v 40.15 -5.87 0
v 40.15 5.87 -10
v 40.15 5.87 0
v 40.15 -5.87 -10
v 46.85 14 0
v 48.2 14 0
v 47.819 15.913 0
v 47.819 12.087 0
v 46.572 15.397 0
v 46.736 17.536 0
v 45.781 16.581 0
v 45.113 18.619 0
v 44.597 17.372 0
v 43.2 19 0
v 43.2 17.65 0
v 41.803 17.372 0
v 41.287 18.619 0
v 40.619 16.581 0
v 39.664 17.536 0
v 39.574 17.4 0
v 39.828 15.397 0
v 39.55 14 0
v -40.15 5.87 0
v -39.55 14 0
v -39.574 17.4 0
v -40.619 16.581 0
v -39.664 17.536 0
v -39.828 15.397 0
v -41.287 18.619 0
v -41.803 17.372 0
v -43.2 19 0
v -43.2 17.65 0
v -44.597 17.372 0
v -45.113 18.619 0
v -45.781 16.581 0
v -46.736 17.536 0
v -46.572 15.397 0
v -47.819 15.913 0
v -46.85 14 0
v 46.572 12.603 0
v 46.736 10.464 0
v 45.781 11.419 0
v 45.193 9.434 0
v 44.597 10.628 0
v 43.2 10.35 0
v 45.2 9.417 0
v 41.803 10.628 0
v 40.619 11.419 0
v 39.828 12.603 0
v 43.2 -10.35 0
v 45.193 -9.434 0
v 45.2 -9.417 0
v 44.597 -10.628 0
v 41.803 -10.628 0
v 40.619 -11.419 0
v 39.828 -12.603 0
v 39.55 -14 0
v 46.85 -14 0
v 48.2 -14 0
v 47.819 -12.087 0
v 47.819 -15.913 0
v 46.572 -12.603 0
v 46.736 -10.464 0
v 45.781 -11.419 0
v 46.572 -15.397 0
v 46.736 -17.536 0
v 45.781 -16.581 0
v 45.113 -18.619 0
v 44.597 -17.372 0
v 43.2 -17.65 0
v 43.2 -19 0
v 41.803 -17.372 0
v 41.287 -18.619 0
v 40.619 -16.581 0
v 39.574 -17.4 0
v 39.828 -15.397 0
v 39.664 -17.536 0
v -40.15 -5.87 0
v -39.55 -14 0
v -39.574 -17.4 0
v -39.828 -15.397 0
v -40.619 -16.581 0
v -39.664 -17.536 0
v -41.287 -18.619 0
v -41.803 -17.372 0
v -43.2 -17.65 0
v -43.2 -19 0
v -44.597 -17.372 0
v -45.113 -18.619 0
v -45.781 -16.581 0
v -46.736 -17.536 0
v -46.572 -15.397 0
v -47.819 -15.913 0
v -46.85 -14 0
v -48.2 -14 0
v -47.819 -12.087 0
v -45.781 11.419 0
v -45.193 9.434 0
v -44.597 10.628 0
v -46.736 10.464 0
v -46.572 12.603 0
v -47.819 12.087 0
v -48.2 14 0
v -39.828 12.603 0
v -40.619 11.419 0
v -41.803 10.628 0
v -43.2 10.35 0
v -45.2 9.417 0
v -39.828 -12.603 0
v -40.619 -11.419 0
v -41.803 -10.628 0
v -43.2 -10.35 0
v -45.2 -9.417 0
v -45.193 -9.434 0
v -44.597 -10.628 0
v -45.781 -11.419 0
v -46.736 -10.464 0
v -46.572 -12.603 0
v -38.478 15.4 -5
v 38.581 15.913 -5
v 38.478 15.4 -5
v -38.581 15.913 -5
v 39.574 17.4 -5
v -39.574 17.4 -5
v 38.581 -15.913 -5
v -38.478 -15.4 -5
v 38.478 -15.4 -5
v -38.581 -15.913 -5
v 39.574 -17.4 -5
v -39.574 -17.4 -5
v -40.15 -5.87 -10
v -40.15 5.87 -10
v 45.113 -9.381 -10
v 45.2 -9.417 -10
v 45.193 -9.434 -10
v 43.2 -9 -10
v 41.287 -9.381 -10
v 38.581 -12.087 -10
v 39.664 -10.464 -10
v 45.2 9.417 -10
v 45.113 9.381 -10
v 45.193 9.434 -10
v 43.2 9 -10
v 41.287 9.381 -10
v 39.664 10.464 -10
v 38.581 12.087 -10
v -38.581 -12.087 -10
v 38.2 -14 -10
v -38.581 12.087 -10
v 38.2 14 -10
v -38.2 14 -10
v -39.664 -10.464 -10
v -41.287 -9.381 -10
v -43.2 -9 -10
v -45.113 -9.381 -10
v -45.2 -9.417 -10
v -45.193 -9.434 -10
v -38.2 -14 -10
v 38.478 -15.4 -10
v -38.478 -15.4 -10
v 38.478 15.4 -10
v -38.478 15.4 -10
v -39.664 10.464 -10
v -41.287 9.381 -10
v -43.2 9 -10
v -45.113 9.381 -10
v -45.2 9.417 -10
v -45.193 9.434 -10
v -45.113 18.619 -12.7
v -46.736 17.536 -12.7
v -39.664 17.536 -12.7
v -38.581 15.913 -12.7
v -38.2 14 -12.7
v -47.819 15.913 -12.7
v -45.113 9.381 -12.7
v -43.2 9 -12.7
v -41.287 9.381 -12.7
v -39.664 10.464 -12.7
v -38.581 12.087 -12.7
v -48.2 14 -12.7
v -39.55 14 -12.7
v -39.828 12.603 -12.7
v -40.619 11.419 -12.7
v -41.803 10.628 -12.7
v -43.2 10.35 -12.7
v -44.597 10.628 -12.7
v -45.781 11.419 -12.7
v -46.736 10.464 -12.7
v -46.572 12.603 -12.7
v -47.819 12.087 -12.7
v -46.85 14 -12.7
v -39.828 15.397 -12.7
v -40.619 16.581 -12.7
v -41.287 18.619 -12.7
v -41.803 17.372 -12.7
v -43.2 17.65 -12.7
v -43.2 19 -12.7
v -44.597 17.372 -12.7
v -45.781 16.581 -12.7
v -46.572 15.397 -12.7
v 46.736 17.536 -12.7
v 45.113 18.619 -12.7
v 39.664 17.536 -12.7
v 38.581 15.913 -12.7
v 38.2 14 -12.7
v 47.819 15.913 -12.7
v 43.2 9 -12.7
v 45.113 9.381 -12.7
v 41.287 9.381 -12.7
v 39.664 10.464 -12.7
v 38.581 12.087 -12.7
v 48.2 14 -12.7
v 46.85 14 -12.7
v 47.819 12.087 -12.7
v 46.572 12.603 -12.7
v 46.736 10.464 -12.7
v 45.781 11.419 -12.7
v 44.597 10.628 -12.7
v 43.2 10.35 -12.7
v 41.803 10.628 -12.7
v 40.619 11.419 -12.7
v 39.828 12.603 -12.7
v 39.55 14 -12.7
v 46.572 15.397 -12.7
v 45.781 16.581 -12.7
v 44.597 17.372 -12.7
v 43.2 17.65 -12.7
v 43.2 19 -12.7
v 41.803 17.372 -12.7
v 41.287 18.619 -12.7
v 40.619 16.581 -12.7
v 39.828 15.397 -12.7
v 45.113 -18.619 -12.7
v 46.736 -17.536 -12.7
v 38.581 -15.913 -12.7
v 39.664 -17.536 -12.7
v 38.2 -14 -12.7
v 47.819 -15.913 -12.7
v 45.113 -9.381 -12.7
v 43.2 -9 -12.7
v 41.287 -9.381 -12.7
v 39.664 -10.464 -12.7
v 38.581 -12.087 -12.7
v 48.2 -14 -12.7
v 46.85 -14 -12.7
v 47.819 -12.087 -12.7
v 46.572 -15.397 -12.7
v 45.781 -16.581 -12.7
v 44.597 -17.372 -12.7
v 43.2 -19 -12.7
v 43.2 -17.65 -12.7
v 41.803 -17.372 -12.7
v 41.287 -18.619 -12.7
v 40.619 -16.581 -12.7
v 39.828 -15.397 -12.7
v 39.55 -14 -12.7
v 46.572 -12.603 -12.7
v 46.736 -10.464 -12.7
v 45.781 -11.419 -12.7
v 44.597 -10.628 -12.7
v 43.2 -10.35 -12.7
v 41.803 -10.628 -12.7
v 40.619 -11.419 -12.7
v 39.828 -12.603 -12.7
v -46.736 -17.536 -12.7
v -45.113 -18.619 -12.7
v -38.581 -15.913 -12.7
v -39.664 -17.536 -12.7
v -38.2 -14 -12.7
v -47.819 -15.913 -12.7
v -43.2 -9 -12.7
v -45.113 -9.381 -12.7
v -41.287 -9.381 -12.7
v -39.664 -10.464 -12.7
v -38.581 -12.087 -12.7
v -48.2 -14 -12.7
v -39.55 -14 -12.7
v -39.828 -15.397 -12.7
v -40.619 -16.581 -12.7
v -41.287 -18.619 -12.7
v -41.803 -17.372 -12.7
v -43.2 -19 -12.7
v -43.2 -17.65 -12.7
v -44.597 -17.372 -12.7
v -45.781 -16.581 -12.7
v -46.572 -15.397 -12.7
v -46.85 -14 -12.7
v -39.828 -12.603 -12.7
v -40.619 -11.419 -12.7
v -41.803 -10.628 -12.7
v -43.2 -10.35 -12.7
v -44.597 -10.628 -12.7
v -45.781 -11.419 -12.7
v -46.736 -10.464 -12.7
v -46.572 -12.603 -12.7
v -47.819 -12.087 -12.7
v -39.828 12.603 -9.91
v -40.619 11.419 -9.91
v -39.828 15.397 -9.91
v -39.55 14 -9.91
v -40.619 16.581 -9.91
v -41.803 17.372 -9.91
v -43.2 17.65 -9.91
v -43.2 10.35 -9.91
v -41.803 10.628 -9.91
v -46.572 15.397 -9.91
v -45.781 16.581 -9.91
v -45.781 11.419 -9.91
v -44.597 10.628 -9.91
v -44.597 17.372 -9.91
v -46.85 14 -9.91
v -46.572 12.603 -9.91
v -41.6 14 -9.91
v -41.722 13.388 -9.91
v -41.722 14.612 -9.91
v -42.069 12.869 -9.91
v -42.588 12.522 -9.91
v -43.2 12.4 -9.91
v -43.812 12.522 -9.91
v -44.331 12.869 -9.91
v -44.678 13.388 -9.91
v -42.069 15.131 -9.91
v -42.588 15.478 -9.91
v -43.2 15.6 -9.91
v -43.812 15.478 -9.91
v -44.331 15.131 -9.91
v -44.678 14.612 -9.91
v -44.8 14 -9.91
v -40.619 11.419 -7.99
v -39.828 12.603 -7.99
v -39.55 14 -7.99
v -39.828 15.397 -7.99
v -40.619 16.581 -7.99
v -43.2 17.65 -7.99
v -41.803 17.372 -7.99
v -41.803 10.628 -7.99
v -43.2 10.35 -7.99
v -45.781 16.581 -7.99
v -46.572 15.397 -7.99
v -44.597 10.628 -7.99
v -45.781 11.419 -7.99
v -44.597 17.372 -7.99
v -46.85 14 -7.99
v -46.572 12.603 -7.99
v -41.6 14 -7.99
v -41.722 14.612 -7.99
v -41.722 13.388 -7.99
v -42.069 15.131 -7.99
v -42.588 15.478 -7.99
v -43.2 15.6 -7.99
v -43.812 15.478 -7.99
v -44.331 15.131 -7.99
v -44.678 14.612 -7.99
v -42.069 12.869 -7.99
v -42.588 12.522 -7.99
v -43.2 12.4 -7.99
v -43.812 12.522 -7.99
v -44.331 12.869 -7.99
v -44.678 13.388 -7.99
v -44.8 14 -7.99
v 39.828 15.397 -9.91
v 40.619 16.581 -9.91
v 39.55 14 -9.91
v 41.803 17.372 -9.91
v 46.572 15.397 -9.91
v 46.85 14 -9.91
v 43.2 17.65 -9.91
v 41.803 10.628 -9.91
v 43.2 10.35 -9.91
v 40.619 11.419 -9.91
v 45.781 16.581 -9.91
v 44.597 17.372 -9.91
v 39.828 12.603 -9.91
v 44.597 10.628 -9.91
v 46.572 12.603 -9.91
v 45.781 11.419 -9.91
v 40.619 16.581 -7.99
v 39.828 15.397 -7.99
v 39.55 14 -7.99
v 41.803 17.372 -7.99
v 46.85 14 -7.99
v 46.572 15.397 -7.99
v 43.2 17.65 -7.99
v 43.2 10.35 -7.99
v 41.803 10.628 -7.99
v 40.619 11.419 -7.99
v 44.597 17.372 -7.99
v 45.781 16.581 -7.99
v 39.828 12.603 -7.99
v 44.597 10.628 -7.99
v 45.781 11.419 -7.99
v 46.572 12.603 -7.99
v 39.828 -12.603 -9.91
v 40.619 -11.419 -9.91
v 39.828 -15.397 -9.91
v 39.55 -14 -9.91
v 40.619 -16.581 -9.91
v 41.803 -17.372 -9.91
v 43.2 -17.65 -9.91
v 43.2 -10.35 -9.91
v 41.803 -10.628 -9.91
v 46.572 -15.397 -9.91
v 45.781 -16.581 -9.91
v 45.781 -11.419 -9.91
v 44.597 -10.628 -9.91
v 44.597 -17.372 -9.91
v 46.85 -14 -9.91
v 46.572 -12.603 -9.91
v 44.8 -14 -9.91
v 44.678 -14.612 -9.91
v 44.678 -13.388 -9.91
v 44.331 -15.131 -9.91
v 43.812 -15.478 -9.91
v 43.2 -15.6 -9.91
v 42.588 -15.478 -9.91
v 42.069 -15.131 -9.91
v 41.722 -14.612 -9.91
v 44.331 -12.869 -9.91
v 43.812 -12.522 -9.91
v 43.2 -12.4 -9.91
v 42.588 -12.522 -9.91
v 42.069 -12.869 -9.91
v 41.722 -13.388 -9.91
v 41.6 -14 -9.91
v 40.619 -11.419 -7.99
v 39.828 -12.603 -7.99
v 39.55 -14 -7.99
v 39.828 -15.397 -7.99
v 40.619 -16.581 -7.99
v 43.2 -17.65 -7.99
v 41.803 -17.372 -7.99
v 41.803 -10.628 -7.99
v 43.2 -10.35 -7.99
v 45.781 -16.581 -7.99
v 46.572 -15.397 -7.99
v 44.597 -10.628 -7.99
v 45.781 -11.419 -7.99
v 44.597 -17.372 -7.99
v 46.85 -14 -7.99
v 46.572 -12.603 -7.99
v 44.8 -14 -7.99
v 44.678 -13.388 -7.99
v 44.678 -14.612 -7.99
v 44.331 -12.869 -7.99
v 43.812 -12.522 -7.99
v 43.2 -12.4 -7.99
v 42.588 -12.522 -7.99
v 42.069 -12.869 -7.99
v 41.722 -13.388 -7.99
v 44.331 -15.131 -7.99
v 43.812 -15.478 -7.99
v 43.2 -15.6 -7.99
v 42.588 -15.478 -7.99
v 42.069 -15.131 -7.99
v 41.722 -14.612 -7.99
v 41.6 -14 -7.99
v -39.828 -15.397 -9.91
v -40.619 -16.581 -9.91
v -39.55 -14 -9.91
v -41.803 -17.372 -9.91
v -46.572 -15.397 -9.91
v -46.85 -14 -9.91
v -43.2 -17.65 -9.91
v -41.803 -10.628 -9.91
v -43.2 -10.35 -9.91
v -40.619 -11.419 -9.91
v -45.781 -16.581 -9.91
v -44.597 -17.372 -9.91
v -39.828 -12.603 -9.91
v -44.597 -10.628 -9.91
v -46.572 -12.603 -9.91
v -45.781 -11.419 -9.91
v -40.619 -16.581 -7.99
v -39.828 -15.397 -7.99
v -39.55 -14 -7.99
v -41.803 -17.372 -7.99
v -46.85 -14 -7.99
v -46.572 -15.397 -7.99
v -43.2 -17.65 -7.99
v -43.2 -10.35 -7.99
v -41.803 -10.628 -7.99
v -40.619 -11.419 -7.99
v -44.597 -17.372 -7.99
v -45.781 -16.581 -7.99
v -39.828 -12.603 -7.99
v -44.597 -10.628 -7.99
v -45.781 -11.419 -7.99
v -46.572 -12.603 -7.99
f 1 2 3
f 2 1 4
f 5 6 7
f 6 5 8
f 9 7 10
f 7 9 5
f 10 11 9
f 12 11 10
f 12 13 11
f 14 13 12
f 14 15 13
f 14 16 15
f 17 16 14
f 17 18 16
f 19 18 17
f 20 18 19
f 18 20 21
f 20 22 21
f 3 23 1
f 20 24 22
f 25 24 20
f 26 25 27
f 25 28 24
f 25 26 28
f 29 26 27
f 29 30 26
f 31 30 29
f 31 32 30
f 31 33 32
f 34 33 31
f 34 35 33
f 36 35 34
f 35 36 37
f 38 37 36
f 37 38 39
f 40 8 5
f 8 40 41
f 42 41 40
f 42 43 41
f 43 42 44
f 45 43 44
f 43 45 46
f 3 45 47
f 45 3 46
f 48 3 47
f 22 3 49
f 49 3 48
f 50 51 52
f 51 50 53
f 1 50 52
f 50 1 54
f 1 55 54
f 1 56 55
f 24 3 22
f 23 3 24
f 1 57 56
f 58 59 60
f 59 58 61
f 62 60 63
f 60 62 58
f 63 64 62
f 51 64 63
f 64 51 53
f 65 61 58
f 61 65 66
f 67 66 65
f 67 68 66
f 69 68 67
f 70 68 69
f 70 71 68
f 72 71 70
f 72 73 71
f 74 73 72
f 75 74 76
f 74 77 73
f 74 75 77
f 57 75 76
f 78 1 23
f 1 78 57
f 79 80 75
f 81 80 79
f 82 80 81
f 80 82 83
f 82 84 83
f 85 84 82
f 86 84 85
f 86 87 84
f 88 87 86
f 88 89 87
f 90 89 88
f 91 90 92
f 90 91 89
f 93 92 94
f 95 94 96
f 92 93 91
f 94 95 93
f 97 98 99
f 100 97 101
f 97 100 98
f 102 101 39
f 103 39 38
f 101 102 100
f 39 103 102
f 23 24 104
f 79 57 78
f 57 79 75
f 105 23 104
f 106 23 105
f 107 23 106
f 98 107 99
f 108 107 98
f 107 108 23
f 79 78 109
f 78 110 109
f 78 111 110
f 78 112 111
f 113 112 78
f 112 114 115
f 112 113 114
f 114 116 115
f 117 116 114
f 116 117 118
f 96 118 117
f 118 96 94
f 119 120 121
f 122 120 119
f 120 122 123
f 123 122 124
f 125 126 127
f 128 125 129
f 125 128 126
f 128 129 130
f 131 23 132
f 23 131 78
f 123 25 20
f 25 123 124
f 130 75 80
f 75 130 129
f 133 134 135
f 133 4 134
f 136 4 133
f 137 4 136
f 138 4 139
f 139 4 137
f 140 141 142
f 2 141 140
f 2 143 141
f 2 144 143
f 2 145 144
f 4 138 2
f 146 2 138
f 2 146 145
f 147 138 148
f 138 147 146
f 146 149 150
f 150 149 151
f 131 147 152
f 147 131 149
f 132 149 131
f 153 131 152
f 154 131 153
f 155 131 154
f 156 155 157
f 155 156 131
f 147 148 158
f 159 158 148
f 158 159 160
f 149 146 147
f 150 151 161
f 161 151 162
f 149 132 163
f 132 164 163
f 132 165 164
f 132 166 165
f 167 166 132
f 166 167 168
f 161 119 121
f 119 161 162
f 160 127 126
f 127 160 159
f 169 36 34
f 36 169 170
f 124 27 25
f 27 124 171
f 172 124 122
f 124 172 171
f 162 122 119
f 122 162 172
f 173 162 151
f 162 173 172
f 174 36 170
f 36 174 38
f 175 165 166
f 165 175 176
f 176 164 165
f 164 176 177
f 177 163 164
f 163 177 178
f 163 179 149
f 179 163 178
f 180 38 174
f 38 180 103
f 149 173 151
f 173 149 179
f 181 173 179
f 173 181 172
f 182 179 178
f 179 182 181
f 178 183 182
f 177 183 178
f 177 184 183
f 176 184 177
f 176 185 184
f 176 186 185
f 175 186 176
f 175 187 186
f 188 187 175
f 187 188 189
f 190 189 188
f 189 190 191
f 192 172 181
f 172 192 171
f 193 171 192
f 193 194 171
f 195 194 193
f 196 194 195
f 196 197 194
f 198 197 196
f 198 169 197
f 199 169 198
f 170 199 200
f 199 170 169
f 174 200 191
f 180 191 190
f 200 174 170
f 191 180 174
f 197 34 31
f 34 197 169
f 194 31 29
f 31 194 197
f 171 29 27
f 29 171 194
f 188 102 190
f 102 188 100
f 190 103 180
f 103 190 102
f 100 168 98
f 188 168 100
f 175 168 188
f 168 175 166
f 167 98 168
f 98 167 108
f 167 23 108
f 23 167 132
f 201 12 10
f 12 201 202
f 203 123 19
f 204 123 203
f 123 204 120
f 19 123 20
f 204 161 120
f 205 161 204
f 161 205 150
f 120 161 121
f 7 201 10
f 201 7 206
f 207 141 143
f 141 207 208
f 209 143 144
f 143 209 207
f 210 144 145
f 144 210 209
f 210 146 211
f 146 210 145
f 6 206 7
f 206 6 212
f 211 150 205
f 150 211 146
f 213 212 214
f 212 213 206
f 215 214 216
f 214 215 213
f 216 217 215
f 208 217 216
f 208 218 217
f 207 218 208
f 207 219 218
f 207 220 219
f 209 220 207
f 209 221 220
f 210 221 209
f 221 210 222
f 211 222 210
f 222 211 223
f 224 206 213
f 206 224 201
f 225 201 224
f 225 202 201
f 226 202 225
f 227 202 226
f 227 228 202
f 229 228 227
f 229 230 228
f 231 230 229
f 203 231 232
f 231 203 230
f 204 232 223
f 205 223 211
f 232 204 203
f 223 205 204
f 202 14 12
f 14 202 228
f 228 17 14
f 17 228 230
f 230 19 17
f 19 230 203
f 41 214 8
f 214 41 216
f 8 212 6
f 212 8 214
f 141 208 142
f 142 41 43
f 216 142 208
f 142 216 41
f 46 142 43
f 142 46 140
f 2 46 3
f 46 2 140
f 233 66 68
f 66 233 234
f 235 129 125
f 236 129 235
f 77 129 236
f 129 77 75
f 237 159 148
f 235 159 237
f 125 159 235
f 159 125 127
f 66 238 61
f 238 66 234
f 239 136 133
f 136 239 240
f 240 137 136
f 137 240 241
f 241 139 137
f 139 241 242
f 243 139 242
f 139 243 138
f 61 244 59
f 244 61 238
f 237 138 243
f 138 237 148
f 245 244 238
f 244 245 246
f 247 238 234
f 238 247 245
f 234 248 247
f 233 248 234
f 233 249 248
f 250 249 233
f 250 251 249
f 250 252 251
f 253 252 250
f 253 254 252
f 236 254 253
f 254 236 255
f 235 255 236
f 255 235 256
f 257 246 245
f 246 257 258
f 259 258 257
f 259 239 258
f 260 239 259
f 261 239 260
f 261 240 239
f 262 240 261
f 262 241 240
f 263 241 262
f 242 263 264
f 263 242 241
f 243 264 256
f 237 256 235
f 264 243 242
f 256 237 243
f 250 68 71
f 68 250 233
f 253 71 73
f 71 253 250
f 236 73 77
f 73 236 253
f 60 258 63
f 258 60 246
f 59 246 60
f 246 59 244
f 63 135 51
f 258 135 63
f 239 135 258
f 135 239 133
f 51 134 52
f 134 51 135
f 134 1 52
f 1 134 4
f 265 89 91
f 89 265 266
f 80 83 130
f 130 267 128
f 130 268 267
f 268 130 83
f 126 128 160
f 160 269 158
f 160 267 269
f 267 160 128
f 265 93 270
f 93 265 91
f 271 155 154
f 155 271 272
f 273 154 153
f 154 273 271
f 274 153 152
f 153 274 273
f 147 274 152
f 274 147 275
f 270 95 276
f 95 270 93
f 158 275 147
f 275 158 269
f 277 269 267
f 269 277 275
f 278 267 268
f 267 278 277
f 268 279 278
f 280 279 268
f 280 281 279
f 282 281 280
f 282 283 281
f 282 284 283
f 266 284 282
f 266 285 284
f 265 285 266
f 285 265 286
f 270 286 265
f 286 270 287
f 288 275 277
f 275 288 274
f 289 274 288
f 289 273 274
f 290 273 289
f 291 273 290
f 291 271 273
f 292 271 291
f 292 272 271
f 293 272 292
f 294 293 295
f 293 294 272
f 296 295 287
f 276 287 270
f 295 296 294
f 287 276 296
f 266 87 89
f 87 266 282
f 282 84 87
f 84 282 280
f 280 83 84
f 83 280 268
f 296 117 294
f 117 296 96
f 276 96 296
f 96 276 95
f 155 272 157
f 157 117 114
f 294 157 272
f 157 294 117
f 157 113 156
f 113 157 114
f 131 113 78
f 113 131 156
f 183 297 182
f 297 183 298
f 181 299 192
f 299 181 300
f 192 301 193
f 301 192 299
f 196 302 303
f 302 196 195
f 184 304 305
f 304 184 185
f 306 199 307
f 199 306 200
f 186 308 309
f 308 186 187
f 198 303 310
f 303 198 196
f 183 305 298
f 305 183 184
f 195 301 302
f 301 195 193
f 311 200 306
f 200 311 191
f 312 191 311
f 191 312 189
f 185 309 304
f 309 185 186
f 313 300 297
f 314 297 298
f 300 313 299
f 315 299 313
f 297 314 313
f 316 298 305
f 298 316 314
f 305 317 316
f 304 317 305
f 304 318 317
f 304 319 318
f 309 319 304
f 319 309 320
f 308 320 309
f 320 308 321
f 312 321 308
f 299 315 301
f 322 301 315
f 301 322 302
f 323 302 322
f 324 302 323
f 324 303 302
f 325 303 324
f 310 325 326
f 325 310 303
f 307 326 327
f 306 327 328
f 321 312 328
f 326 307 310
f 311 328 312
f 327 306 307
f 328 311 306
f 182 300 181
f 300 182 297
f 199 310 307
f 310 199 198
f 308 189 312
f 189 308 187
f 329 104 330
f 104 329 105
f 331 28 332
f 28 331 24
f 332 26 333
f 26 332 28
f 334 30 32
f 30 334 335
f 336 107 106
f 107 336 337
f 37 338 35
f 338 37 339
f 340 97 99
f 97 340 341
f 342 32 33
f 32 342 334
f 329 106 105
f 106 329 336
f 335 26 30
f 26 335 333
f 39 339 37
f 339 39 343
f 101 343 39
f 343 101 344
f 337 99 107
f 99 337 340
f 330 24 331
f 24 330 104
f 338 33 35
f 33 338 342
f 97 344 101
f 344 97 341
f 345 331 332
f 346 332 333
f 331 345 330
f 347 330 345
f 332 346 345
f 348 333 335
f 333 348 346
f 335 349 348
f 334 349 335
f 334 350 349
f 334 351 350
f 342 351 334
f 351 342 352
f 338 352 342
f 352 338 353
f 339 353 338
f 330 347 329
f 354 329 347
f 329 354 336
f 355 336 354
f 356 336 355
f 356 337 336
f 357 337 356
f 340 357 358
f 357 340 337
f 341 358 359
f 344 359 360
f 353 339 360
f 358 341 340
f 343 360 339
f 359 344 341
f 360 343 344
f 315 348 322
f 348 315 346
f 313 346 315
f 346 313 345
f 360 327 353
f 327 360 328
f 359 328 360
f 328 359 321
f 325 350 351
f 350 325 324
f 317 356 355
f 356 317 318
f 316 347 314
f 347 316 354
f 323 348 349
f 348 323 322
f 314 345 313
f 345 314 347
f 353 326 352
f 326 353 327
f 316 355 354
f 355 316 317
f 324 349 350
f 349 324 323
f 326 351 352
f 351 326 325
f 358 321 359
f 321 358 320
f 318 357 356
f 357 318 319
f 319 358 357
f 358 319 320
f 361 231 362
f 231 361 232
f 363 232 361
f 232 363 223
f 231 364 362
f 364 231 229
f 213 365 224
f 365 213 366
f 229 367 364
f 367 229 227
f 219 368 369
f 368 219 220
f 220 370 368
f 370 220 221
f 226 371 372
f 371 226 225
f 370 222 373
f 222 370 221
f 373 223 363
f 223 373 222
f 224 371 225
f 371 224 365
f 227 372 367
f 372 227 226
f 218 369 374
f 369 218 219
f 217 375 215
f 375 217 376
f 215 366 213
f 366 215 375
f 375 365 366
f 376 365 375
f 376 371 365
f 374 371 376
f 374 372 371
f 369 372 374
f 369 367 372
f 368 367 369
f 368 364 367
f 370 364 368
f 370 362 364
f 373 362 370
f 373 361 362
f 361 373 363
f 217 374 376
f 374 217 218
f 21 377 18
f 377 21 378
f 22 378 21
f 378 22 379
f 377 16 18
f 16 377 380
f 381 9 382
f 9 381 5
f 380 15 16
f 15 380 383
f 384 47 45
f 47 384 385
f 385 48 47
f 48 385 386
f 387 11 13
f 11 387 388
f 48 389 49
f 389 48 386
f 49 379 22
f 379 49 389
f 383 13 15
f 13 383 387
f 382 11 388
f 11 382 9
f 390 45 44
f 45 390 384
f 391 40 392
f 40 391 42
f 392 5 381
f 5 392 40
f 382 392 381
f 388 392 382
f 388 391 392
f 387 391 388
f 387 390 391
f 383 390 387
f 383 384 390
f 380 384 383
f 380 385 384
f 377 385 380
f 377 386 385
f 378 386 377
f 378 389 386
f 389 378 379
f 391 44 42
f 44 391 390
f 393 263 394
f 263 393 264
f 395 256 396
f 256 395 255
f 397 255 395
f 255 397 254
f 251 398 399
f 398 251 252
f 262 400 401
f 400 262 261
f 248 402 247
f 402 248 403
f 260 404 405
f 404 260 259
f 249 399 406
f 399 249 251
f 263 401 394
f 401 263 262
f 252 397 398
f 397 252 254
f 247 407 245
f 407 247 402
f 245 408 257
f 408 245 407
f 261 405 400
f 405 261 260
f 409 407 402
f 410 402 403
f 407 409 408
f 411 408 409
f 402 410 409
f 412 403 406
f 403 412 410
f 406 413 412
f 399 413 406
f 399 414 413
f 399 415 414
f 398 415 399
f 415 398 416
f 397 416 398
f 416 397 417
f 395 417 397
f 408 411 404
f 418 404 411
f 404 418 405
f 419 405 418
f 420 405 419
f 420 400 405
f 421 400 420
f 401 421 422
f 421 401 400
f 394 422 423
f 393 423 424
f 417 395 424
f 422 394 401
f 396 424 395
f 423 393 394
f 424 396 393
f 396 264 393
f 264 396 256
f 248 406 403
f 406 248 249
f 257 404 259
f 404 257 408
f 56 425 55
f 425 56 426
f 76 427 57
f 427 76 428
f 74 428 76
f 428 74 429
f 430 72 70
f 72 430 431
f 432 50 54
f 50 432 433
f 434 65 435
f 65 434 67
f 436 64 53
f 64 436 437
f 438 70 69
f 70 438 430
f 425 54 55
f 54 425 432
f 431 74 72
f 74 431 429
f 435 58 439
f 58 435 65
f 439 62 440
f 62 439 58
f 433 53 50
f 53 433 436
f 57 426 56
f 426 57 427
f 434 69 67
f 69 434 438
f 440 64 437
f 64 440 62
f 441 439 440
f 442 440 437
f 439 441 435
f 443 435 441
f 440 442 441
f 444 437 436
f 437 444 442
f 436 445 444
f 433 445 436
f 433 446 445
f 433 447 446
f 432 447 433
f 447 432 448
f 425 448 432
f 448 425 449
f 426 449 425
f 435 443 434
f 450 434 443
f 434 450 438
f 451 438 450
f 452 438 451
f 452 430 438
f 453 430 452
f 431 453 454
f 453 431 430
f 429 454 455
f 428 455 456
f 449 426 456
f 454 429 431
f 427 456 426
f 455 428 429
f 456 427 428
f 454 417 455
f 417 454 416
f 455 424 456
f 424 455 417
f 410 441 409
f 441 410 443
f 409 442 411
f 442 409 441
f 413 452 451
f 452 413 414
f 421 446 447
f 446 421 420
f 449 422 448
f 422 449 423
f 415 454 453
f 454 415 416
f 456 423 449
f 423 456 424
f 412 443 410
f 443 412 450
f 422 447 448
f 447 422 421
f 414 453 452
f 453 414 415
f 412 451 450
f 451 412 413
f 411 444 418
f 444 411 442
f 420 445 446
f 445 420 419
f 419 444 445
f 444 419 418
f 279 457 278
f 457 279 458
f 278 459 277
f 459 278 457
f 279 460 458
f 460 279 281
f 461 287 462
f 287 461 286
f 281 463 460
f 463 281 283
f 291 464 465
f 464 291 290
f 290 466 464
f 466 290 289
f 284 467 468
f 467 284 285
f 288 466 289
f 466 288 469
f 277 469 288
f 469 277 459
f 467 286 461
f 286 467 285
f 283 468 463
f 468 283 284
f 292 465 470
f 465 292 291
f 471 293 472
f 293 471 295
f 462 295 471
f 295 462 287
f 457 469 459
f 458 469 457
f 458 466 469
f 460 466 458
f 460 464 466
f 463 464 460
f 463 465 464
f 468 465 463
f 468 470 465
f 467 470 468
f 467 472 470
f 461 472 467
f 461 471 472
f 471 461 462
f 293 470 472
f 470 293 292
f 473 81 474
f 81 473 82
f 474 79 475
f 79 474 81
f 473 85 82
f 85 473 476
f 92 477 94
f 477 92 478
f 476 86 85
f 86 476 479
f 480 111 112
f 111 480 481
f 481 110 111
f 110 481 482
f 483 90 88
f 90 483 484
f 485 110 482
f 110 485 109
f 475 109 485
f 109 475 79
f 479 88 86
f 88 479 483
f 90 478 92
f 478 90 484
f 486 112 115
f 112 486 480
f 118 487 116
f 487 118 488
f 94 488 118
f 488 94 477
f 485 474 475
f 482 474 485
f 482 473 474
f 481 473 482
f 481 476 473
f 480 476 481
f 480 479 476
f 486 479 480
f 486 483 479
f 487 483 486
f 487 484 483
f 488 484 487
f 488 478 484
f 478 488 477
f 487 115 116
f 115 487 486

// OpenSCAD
$fn=16;



// Upper (slightly wider) frame
uf = [ 80.3, 34.8, 5 ];

// Lower (n arrower) frame
lf = [ uf[0], 30.8, 5 ];

// Height of the ear's barrel
ear_height = 12.7;

// Diameters
ear_od = 10;
ear_id = 7.3;
ear_hole = 3.2;

// Depth of the top and bottom large holes
ear_td = 8;
ear_bd = 2.8;


module body() {

  translate([-uf[0]/2, -uf[1]/2, -uf[2]])
    cube(uf);

  translate([-lf[0]/2, -lf[1]/2, -uf[2]-lf[2]])
    cube(lf);

}


module ear_cuts(screw=true) {


    translate([0,0, (ear_bd/2) - ear_height - 0.01])
      cylinder(h=ear_bd, d=ear_id, center=true);

    translate([0,0, -ear_td/2 + 0.01])
      cylinder(h=ear_td, d=ear_id, center=true);

    if (screw == true) {
      translate([0,0, -ear_height/2])
        cylinder(h=ear_height, d=ear_hole, center=true);

    }

}

// Centered X,Y and hanging under the XY plane
module ear() {

  r = ear_od/2;

  // Measurements extrapolated on paper
  chamfer_o_x = 7-r;
  chamfer_extent = 9.5;


  chamfer_o_a = 180+acos((chamfer_o_x)/r);
  chamfer_o_y = r * sin(chamfer_o_a);
  echo(a=chamfer_o_a, x=chamfer_o_x, y=chamfer_o_y);


  echo(chamfer_o_y);
  union() {
    translate([0,0,-ear_height/2])
      cylinder(h=ear_height, d=ear_od, center=true);

    // The surface where the ear chamfer meets the frame
    mirror([0,0,1])
      linear_extrude(uf[2] + lf[2])
        polygon([ [0,0],
                  [r,0],
                  [r, -chamfer_extent],
                  [-chamfer_o_x, chamfer_o_y] ]);
  }
}



//
// Top-level module
//
module jack_frame() {

  ear_ow = 96.4;
  ear_oh = 38;

  ear_cc_x = ear_ow - ear_od;
  ear_cc_y = ear_oh - ear_od;

  ear_x = ear_cc_x / 2;
  ear_y = ear_cc_y / 2;


  difference() {
    union() {
      body();

      translate([-ear_x, ear_y])
        ear();

      translate([ear_x, ear_y])
        mirror([1,0,0])
          ear();

      translate([ear_x, -ear_y])
        rotate([0,0,180])
          ear();

      translate([-ear_x, -ear_y])
        mirror([0,1,0])
          ear();
    }

    // Since the cuts actually go into the upper frame and not just
    // the ear barrels, they have to made separately...
    union() {

      translate([-ear_x, ear_y])
        ear_cuts(true);

      translate([ear_x, ear_y])
        mirror([1,0,0])
          ear_cuts(false);

      translate([ear_x, -ear_y])
        rotate([0,0,180])
          ear_cuts(true);

      translate([-ear_x, -ear_y])
        mirror([0,1,0])
          ear_cuts(false);
    }
  }


}



jack_frame();
